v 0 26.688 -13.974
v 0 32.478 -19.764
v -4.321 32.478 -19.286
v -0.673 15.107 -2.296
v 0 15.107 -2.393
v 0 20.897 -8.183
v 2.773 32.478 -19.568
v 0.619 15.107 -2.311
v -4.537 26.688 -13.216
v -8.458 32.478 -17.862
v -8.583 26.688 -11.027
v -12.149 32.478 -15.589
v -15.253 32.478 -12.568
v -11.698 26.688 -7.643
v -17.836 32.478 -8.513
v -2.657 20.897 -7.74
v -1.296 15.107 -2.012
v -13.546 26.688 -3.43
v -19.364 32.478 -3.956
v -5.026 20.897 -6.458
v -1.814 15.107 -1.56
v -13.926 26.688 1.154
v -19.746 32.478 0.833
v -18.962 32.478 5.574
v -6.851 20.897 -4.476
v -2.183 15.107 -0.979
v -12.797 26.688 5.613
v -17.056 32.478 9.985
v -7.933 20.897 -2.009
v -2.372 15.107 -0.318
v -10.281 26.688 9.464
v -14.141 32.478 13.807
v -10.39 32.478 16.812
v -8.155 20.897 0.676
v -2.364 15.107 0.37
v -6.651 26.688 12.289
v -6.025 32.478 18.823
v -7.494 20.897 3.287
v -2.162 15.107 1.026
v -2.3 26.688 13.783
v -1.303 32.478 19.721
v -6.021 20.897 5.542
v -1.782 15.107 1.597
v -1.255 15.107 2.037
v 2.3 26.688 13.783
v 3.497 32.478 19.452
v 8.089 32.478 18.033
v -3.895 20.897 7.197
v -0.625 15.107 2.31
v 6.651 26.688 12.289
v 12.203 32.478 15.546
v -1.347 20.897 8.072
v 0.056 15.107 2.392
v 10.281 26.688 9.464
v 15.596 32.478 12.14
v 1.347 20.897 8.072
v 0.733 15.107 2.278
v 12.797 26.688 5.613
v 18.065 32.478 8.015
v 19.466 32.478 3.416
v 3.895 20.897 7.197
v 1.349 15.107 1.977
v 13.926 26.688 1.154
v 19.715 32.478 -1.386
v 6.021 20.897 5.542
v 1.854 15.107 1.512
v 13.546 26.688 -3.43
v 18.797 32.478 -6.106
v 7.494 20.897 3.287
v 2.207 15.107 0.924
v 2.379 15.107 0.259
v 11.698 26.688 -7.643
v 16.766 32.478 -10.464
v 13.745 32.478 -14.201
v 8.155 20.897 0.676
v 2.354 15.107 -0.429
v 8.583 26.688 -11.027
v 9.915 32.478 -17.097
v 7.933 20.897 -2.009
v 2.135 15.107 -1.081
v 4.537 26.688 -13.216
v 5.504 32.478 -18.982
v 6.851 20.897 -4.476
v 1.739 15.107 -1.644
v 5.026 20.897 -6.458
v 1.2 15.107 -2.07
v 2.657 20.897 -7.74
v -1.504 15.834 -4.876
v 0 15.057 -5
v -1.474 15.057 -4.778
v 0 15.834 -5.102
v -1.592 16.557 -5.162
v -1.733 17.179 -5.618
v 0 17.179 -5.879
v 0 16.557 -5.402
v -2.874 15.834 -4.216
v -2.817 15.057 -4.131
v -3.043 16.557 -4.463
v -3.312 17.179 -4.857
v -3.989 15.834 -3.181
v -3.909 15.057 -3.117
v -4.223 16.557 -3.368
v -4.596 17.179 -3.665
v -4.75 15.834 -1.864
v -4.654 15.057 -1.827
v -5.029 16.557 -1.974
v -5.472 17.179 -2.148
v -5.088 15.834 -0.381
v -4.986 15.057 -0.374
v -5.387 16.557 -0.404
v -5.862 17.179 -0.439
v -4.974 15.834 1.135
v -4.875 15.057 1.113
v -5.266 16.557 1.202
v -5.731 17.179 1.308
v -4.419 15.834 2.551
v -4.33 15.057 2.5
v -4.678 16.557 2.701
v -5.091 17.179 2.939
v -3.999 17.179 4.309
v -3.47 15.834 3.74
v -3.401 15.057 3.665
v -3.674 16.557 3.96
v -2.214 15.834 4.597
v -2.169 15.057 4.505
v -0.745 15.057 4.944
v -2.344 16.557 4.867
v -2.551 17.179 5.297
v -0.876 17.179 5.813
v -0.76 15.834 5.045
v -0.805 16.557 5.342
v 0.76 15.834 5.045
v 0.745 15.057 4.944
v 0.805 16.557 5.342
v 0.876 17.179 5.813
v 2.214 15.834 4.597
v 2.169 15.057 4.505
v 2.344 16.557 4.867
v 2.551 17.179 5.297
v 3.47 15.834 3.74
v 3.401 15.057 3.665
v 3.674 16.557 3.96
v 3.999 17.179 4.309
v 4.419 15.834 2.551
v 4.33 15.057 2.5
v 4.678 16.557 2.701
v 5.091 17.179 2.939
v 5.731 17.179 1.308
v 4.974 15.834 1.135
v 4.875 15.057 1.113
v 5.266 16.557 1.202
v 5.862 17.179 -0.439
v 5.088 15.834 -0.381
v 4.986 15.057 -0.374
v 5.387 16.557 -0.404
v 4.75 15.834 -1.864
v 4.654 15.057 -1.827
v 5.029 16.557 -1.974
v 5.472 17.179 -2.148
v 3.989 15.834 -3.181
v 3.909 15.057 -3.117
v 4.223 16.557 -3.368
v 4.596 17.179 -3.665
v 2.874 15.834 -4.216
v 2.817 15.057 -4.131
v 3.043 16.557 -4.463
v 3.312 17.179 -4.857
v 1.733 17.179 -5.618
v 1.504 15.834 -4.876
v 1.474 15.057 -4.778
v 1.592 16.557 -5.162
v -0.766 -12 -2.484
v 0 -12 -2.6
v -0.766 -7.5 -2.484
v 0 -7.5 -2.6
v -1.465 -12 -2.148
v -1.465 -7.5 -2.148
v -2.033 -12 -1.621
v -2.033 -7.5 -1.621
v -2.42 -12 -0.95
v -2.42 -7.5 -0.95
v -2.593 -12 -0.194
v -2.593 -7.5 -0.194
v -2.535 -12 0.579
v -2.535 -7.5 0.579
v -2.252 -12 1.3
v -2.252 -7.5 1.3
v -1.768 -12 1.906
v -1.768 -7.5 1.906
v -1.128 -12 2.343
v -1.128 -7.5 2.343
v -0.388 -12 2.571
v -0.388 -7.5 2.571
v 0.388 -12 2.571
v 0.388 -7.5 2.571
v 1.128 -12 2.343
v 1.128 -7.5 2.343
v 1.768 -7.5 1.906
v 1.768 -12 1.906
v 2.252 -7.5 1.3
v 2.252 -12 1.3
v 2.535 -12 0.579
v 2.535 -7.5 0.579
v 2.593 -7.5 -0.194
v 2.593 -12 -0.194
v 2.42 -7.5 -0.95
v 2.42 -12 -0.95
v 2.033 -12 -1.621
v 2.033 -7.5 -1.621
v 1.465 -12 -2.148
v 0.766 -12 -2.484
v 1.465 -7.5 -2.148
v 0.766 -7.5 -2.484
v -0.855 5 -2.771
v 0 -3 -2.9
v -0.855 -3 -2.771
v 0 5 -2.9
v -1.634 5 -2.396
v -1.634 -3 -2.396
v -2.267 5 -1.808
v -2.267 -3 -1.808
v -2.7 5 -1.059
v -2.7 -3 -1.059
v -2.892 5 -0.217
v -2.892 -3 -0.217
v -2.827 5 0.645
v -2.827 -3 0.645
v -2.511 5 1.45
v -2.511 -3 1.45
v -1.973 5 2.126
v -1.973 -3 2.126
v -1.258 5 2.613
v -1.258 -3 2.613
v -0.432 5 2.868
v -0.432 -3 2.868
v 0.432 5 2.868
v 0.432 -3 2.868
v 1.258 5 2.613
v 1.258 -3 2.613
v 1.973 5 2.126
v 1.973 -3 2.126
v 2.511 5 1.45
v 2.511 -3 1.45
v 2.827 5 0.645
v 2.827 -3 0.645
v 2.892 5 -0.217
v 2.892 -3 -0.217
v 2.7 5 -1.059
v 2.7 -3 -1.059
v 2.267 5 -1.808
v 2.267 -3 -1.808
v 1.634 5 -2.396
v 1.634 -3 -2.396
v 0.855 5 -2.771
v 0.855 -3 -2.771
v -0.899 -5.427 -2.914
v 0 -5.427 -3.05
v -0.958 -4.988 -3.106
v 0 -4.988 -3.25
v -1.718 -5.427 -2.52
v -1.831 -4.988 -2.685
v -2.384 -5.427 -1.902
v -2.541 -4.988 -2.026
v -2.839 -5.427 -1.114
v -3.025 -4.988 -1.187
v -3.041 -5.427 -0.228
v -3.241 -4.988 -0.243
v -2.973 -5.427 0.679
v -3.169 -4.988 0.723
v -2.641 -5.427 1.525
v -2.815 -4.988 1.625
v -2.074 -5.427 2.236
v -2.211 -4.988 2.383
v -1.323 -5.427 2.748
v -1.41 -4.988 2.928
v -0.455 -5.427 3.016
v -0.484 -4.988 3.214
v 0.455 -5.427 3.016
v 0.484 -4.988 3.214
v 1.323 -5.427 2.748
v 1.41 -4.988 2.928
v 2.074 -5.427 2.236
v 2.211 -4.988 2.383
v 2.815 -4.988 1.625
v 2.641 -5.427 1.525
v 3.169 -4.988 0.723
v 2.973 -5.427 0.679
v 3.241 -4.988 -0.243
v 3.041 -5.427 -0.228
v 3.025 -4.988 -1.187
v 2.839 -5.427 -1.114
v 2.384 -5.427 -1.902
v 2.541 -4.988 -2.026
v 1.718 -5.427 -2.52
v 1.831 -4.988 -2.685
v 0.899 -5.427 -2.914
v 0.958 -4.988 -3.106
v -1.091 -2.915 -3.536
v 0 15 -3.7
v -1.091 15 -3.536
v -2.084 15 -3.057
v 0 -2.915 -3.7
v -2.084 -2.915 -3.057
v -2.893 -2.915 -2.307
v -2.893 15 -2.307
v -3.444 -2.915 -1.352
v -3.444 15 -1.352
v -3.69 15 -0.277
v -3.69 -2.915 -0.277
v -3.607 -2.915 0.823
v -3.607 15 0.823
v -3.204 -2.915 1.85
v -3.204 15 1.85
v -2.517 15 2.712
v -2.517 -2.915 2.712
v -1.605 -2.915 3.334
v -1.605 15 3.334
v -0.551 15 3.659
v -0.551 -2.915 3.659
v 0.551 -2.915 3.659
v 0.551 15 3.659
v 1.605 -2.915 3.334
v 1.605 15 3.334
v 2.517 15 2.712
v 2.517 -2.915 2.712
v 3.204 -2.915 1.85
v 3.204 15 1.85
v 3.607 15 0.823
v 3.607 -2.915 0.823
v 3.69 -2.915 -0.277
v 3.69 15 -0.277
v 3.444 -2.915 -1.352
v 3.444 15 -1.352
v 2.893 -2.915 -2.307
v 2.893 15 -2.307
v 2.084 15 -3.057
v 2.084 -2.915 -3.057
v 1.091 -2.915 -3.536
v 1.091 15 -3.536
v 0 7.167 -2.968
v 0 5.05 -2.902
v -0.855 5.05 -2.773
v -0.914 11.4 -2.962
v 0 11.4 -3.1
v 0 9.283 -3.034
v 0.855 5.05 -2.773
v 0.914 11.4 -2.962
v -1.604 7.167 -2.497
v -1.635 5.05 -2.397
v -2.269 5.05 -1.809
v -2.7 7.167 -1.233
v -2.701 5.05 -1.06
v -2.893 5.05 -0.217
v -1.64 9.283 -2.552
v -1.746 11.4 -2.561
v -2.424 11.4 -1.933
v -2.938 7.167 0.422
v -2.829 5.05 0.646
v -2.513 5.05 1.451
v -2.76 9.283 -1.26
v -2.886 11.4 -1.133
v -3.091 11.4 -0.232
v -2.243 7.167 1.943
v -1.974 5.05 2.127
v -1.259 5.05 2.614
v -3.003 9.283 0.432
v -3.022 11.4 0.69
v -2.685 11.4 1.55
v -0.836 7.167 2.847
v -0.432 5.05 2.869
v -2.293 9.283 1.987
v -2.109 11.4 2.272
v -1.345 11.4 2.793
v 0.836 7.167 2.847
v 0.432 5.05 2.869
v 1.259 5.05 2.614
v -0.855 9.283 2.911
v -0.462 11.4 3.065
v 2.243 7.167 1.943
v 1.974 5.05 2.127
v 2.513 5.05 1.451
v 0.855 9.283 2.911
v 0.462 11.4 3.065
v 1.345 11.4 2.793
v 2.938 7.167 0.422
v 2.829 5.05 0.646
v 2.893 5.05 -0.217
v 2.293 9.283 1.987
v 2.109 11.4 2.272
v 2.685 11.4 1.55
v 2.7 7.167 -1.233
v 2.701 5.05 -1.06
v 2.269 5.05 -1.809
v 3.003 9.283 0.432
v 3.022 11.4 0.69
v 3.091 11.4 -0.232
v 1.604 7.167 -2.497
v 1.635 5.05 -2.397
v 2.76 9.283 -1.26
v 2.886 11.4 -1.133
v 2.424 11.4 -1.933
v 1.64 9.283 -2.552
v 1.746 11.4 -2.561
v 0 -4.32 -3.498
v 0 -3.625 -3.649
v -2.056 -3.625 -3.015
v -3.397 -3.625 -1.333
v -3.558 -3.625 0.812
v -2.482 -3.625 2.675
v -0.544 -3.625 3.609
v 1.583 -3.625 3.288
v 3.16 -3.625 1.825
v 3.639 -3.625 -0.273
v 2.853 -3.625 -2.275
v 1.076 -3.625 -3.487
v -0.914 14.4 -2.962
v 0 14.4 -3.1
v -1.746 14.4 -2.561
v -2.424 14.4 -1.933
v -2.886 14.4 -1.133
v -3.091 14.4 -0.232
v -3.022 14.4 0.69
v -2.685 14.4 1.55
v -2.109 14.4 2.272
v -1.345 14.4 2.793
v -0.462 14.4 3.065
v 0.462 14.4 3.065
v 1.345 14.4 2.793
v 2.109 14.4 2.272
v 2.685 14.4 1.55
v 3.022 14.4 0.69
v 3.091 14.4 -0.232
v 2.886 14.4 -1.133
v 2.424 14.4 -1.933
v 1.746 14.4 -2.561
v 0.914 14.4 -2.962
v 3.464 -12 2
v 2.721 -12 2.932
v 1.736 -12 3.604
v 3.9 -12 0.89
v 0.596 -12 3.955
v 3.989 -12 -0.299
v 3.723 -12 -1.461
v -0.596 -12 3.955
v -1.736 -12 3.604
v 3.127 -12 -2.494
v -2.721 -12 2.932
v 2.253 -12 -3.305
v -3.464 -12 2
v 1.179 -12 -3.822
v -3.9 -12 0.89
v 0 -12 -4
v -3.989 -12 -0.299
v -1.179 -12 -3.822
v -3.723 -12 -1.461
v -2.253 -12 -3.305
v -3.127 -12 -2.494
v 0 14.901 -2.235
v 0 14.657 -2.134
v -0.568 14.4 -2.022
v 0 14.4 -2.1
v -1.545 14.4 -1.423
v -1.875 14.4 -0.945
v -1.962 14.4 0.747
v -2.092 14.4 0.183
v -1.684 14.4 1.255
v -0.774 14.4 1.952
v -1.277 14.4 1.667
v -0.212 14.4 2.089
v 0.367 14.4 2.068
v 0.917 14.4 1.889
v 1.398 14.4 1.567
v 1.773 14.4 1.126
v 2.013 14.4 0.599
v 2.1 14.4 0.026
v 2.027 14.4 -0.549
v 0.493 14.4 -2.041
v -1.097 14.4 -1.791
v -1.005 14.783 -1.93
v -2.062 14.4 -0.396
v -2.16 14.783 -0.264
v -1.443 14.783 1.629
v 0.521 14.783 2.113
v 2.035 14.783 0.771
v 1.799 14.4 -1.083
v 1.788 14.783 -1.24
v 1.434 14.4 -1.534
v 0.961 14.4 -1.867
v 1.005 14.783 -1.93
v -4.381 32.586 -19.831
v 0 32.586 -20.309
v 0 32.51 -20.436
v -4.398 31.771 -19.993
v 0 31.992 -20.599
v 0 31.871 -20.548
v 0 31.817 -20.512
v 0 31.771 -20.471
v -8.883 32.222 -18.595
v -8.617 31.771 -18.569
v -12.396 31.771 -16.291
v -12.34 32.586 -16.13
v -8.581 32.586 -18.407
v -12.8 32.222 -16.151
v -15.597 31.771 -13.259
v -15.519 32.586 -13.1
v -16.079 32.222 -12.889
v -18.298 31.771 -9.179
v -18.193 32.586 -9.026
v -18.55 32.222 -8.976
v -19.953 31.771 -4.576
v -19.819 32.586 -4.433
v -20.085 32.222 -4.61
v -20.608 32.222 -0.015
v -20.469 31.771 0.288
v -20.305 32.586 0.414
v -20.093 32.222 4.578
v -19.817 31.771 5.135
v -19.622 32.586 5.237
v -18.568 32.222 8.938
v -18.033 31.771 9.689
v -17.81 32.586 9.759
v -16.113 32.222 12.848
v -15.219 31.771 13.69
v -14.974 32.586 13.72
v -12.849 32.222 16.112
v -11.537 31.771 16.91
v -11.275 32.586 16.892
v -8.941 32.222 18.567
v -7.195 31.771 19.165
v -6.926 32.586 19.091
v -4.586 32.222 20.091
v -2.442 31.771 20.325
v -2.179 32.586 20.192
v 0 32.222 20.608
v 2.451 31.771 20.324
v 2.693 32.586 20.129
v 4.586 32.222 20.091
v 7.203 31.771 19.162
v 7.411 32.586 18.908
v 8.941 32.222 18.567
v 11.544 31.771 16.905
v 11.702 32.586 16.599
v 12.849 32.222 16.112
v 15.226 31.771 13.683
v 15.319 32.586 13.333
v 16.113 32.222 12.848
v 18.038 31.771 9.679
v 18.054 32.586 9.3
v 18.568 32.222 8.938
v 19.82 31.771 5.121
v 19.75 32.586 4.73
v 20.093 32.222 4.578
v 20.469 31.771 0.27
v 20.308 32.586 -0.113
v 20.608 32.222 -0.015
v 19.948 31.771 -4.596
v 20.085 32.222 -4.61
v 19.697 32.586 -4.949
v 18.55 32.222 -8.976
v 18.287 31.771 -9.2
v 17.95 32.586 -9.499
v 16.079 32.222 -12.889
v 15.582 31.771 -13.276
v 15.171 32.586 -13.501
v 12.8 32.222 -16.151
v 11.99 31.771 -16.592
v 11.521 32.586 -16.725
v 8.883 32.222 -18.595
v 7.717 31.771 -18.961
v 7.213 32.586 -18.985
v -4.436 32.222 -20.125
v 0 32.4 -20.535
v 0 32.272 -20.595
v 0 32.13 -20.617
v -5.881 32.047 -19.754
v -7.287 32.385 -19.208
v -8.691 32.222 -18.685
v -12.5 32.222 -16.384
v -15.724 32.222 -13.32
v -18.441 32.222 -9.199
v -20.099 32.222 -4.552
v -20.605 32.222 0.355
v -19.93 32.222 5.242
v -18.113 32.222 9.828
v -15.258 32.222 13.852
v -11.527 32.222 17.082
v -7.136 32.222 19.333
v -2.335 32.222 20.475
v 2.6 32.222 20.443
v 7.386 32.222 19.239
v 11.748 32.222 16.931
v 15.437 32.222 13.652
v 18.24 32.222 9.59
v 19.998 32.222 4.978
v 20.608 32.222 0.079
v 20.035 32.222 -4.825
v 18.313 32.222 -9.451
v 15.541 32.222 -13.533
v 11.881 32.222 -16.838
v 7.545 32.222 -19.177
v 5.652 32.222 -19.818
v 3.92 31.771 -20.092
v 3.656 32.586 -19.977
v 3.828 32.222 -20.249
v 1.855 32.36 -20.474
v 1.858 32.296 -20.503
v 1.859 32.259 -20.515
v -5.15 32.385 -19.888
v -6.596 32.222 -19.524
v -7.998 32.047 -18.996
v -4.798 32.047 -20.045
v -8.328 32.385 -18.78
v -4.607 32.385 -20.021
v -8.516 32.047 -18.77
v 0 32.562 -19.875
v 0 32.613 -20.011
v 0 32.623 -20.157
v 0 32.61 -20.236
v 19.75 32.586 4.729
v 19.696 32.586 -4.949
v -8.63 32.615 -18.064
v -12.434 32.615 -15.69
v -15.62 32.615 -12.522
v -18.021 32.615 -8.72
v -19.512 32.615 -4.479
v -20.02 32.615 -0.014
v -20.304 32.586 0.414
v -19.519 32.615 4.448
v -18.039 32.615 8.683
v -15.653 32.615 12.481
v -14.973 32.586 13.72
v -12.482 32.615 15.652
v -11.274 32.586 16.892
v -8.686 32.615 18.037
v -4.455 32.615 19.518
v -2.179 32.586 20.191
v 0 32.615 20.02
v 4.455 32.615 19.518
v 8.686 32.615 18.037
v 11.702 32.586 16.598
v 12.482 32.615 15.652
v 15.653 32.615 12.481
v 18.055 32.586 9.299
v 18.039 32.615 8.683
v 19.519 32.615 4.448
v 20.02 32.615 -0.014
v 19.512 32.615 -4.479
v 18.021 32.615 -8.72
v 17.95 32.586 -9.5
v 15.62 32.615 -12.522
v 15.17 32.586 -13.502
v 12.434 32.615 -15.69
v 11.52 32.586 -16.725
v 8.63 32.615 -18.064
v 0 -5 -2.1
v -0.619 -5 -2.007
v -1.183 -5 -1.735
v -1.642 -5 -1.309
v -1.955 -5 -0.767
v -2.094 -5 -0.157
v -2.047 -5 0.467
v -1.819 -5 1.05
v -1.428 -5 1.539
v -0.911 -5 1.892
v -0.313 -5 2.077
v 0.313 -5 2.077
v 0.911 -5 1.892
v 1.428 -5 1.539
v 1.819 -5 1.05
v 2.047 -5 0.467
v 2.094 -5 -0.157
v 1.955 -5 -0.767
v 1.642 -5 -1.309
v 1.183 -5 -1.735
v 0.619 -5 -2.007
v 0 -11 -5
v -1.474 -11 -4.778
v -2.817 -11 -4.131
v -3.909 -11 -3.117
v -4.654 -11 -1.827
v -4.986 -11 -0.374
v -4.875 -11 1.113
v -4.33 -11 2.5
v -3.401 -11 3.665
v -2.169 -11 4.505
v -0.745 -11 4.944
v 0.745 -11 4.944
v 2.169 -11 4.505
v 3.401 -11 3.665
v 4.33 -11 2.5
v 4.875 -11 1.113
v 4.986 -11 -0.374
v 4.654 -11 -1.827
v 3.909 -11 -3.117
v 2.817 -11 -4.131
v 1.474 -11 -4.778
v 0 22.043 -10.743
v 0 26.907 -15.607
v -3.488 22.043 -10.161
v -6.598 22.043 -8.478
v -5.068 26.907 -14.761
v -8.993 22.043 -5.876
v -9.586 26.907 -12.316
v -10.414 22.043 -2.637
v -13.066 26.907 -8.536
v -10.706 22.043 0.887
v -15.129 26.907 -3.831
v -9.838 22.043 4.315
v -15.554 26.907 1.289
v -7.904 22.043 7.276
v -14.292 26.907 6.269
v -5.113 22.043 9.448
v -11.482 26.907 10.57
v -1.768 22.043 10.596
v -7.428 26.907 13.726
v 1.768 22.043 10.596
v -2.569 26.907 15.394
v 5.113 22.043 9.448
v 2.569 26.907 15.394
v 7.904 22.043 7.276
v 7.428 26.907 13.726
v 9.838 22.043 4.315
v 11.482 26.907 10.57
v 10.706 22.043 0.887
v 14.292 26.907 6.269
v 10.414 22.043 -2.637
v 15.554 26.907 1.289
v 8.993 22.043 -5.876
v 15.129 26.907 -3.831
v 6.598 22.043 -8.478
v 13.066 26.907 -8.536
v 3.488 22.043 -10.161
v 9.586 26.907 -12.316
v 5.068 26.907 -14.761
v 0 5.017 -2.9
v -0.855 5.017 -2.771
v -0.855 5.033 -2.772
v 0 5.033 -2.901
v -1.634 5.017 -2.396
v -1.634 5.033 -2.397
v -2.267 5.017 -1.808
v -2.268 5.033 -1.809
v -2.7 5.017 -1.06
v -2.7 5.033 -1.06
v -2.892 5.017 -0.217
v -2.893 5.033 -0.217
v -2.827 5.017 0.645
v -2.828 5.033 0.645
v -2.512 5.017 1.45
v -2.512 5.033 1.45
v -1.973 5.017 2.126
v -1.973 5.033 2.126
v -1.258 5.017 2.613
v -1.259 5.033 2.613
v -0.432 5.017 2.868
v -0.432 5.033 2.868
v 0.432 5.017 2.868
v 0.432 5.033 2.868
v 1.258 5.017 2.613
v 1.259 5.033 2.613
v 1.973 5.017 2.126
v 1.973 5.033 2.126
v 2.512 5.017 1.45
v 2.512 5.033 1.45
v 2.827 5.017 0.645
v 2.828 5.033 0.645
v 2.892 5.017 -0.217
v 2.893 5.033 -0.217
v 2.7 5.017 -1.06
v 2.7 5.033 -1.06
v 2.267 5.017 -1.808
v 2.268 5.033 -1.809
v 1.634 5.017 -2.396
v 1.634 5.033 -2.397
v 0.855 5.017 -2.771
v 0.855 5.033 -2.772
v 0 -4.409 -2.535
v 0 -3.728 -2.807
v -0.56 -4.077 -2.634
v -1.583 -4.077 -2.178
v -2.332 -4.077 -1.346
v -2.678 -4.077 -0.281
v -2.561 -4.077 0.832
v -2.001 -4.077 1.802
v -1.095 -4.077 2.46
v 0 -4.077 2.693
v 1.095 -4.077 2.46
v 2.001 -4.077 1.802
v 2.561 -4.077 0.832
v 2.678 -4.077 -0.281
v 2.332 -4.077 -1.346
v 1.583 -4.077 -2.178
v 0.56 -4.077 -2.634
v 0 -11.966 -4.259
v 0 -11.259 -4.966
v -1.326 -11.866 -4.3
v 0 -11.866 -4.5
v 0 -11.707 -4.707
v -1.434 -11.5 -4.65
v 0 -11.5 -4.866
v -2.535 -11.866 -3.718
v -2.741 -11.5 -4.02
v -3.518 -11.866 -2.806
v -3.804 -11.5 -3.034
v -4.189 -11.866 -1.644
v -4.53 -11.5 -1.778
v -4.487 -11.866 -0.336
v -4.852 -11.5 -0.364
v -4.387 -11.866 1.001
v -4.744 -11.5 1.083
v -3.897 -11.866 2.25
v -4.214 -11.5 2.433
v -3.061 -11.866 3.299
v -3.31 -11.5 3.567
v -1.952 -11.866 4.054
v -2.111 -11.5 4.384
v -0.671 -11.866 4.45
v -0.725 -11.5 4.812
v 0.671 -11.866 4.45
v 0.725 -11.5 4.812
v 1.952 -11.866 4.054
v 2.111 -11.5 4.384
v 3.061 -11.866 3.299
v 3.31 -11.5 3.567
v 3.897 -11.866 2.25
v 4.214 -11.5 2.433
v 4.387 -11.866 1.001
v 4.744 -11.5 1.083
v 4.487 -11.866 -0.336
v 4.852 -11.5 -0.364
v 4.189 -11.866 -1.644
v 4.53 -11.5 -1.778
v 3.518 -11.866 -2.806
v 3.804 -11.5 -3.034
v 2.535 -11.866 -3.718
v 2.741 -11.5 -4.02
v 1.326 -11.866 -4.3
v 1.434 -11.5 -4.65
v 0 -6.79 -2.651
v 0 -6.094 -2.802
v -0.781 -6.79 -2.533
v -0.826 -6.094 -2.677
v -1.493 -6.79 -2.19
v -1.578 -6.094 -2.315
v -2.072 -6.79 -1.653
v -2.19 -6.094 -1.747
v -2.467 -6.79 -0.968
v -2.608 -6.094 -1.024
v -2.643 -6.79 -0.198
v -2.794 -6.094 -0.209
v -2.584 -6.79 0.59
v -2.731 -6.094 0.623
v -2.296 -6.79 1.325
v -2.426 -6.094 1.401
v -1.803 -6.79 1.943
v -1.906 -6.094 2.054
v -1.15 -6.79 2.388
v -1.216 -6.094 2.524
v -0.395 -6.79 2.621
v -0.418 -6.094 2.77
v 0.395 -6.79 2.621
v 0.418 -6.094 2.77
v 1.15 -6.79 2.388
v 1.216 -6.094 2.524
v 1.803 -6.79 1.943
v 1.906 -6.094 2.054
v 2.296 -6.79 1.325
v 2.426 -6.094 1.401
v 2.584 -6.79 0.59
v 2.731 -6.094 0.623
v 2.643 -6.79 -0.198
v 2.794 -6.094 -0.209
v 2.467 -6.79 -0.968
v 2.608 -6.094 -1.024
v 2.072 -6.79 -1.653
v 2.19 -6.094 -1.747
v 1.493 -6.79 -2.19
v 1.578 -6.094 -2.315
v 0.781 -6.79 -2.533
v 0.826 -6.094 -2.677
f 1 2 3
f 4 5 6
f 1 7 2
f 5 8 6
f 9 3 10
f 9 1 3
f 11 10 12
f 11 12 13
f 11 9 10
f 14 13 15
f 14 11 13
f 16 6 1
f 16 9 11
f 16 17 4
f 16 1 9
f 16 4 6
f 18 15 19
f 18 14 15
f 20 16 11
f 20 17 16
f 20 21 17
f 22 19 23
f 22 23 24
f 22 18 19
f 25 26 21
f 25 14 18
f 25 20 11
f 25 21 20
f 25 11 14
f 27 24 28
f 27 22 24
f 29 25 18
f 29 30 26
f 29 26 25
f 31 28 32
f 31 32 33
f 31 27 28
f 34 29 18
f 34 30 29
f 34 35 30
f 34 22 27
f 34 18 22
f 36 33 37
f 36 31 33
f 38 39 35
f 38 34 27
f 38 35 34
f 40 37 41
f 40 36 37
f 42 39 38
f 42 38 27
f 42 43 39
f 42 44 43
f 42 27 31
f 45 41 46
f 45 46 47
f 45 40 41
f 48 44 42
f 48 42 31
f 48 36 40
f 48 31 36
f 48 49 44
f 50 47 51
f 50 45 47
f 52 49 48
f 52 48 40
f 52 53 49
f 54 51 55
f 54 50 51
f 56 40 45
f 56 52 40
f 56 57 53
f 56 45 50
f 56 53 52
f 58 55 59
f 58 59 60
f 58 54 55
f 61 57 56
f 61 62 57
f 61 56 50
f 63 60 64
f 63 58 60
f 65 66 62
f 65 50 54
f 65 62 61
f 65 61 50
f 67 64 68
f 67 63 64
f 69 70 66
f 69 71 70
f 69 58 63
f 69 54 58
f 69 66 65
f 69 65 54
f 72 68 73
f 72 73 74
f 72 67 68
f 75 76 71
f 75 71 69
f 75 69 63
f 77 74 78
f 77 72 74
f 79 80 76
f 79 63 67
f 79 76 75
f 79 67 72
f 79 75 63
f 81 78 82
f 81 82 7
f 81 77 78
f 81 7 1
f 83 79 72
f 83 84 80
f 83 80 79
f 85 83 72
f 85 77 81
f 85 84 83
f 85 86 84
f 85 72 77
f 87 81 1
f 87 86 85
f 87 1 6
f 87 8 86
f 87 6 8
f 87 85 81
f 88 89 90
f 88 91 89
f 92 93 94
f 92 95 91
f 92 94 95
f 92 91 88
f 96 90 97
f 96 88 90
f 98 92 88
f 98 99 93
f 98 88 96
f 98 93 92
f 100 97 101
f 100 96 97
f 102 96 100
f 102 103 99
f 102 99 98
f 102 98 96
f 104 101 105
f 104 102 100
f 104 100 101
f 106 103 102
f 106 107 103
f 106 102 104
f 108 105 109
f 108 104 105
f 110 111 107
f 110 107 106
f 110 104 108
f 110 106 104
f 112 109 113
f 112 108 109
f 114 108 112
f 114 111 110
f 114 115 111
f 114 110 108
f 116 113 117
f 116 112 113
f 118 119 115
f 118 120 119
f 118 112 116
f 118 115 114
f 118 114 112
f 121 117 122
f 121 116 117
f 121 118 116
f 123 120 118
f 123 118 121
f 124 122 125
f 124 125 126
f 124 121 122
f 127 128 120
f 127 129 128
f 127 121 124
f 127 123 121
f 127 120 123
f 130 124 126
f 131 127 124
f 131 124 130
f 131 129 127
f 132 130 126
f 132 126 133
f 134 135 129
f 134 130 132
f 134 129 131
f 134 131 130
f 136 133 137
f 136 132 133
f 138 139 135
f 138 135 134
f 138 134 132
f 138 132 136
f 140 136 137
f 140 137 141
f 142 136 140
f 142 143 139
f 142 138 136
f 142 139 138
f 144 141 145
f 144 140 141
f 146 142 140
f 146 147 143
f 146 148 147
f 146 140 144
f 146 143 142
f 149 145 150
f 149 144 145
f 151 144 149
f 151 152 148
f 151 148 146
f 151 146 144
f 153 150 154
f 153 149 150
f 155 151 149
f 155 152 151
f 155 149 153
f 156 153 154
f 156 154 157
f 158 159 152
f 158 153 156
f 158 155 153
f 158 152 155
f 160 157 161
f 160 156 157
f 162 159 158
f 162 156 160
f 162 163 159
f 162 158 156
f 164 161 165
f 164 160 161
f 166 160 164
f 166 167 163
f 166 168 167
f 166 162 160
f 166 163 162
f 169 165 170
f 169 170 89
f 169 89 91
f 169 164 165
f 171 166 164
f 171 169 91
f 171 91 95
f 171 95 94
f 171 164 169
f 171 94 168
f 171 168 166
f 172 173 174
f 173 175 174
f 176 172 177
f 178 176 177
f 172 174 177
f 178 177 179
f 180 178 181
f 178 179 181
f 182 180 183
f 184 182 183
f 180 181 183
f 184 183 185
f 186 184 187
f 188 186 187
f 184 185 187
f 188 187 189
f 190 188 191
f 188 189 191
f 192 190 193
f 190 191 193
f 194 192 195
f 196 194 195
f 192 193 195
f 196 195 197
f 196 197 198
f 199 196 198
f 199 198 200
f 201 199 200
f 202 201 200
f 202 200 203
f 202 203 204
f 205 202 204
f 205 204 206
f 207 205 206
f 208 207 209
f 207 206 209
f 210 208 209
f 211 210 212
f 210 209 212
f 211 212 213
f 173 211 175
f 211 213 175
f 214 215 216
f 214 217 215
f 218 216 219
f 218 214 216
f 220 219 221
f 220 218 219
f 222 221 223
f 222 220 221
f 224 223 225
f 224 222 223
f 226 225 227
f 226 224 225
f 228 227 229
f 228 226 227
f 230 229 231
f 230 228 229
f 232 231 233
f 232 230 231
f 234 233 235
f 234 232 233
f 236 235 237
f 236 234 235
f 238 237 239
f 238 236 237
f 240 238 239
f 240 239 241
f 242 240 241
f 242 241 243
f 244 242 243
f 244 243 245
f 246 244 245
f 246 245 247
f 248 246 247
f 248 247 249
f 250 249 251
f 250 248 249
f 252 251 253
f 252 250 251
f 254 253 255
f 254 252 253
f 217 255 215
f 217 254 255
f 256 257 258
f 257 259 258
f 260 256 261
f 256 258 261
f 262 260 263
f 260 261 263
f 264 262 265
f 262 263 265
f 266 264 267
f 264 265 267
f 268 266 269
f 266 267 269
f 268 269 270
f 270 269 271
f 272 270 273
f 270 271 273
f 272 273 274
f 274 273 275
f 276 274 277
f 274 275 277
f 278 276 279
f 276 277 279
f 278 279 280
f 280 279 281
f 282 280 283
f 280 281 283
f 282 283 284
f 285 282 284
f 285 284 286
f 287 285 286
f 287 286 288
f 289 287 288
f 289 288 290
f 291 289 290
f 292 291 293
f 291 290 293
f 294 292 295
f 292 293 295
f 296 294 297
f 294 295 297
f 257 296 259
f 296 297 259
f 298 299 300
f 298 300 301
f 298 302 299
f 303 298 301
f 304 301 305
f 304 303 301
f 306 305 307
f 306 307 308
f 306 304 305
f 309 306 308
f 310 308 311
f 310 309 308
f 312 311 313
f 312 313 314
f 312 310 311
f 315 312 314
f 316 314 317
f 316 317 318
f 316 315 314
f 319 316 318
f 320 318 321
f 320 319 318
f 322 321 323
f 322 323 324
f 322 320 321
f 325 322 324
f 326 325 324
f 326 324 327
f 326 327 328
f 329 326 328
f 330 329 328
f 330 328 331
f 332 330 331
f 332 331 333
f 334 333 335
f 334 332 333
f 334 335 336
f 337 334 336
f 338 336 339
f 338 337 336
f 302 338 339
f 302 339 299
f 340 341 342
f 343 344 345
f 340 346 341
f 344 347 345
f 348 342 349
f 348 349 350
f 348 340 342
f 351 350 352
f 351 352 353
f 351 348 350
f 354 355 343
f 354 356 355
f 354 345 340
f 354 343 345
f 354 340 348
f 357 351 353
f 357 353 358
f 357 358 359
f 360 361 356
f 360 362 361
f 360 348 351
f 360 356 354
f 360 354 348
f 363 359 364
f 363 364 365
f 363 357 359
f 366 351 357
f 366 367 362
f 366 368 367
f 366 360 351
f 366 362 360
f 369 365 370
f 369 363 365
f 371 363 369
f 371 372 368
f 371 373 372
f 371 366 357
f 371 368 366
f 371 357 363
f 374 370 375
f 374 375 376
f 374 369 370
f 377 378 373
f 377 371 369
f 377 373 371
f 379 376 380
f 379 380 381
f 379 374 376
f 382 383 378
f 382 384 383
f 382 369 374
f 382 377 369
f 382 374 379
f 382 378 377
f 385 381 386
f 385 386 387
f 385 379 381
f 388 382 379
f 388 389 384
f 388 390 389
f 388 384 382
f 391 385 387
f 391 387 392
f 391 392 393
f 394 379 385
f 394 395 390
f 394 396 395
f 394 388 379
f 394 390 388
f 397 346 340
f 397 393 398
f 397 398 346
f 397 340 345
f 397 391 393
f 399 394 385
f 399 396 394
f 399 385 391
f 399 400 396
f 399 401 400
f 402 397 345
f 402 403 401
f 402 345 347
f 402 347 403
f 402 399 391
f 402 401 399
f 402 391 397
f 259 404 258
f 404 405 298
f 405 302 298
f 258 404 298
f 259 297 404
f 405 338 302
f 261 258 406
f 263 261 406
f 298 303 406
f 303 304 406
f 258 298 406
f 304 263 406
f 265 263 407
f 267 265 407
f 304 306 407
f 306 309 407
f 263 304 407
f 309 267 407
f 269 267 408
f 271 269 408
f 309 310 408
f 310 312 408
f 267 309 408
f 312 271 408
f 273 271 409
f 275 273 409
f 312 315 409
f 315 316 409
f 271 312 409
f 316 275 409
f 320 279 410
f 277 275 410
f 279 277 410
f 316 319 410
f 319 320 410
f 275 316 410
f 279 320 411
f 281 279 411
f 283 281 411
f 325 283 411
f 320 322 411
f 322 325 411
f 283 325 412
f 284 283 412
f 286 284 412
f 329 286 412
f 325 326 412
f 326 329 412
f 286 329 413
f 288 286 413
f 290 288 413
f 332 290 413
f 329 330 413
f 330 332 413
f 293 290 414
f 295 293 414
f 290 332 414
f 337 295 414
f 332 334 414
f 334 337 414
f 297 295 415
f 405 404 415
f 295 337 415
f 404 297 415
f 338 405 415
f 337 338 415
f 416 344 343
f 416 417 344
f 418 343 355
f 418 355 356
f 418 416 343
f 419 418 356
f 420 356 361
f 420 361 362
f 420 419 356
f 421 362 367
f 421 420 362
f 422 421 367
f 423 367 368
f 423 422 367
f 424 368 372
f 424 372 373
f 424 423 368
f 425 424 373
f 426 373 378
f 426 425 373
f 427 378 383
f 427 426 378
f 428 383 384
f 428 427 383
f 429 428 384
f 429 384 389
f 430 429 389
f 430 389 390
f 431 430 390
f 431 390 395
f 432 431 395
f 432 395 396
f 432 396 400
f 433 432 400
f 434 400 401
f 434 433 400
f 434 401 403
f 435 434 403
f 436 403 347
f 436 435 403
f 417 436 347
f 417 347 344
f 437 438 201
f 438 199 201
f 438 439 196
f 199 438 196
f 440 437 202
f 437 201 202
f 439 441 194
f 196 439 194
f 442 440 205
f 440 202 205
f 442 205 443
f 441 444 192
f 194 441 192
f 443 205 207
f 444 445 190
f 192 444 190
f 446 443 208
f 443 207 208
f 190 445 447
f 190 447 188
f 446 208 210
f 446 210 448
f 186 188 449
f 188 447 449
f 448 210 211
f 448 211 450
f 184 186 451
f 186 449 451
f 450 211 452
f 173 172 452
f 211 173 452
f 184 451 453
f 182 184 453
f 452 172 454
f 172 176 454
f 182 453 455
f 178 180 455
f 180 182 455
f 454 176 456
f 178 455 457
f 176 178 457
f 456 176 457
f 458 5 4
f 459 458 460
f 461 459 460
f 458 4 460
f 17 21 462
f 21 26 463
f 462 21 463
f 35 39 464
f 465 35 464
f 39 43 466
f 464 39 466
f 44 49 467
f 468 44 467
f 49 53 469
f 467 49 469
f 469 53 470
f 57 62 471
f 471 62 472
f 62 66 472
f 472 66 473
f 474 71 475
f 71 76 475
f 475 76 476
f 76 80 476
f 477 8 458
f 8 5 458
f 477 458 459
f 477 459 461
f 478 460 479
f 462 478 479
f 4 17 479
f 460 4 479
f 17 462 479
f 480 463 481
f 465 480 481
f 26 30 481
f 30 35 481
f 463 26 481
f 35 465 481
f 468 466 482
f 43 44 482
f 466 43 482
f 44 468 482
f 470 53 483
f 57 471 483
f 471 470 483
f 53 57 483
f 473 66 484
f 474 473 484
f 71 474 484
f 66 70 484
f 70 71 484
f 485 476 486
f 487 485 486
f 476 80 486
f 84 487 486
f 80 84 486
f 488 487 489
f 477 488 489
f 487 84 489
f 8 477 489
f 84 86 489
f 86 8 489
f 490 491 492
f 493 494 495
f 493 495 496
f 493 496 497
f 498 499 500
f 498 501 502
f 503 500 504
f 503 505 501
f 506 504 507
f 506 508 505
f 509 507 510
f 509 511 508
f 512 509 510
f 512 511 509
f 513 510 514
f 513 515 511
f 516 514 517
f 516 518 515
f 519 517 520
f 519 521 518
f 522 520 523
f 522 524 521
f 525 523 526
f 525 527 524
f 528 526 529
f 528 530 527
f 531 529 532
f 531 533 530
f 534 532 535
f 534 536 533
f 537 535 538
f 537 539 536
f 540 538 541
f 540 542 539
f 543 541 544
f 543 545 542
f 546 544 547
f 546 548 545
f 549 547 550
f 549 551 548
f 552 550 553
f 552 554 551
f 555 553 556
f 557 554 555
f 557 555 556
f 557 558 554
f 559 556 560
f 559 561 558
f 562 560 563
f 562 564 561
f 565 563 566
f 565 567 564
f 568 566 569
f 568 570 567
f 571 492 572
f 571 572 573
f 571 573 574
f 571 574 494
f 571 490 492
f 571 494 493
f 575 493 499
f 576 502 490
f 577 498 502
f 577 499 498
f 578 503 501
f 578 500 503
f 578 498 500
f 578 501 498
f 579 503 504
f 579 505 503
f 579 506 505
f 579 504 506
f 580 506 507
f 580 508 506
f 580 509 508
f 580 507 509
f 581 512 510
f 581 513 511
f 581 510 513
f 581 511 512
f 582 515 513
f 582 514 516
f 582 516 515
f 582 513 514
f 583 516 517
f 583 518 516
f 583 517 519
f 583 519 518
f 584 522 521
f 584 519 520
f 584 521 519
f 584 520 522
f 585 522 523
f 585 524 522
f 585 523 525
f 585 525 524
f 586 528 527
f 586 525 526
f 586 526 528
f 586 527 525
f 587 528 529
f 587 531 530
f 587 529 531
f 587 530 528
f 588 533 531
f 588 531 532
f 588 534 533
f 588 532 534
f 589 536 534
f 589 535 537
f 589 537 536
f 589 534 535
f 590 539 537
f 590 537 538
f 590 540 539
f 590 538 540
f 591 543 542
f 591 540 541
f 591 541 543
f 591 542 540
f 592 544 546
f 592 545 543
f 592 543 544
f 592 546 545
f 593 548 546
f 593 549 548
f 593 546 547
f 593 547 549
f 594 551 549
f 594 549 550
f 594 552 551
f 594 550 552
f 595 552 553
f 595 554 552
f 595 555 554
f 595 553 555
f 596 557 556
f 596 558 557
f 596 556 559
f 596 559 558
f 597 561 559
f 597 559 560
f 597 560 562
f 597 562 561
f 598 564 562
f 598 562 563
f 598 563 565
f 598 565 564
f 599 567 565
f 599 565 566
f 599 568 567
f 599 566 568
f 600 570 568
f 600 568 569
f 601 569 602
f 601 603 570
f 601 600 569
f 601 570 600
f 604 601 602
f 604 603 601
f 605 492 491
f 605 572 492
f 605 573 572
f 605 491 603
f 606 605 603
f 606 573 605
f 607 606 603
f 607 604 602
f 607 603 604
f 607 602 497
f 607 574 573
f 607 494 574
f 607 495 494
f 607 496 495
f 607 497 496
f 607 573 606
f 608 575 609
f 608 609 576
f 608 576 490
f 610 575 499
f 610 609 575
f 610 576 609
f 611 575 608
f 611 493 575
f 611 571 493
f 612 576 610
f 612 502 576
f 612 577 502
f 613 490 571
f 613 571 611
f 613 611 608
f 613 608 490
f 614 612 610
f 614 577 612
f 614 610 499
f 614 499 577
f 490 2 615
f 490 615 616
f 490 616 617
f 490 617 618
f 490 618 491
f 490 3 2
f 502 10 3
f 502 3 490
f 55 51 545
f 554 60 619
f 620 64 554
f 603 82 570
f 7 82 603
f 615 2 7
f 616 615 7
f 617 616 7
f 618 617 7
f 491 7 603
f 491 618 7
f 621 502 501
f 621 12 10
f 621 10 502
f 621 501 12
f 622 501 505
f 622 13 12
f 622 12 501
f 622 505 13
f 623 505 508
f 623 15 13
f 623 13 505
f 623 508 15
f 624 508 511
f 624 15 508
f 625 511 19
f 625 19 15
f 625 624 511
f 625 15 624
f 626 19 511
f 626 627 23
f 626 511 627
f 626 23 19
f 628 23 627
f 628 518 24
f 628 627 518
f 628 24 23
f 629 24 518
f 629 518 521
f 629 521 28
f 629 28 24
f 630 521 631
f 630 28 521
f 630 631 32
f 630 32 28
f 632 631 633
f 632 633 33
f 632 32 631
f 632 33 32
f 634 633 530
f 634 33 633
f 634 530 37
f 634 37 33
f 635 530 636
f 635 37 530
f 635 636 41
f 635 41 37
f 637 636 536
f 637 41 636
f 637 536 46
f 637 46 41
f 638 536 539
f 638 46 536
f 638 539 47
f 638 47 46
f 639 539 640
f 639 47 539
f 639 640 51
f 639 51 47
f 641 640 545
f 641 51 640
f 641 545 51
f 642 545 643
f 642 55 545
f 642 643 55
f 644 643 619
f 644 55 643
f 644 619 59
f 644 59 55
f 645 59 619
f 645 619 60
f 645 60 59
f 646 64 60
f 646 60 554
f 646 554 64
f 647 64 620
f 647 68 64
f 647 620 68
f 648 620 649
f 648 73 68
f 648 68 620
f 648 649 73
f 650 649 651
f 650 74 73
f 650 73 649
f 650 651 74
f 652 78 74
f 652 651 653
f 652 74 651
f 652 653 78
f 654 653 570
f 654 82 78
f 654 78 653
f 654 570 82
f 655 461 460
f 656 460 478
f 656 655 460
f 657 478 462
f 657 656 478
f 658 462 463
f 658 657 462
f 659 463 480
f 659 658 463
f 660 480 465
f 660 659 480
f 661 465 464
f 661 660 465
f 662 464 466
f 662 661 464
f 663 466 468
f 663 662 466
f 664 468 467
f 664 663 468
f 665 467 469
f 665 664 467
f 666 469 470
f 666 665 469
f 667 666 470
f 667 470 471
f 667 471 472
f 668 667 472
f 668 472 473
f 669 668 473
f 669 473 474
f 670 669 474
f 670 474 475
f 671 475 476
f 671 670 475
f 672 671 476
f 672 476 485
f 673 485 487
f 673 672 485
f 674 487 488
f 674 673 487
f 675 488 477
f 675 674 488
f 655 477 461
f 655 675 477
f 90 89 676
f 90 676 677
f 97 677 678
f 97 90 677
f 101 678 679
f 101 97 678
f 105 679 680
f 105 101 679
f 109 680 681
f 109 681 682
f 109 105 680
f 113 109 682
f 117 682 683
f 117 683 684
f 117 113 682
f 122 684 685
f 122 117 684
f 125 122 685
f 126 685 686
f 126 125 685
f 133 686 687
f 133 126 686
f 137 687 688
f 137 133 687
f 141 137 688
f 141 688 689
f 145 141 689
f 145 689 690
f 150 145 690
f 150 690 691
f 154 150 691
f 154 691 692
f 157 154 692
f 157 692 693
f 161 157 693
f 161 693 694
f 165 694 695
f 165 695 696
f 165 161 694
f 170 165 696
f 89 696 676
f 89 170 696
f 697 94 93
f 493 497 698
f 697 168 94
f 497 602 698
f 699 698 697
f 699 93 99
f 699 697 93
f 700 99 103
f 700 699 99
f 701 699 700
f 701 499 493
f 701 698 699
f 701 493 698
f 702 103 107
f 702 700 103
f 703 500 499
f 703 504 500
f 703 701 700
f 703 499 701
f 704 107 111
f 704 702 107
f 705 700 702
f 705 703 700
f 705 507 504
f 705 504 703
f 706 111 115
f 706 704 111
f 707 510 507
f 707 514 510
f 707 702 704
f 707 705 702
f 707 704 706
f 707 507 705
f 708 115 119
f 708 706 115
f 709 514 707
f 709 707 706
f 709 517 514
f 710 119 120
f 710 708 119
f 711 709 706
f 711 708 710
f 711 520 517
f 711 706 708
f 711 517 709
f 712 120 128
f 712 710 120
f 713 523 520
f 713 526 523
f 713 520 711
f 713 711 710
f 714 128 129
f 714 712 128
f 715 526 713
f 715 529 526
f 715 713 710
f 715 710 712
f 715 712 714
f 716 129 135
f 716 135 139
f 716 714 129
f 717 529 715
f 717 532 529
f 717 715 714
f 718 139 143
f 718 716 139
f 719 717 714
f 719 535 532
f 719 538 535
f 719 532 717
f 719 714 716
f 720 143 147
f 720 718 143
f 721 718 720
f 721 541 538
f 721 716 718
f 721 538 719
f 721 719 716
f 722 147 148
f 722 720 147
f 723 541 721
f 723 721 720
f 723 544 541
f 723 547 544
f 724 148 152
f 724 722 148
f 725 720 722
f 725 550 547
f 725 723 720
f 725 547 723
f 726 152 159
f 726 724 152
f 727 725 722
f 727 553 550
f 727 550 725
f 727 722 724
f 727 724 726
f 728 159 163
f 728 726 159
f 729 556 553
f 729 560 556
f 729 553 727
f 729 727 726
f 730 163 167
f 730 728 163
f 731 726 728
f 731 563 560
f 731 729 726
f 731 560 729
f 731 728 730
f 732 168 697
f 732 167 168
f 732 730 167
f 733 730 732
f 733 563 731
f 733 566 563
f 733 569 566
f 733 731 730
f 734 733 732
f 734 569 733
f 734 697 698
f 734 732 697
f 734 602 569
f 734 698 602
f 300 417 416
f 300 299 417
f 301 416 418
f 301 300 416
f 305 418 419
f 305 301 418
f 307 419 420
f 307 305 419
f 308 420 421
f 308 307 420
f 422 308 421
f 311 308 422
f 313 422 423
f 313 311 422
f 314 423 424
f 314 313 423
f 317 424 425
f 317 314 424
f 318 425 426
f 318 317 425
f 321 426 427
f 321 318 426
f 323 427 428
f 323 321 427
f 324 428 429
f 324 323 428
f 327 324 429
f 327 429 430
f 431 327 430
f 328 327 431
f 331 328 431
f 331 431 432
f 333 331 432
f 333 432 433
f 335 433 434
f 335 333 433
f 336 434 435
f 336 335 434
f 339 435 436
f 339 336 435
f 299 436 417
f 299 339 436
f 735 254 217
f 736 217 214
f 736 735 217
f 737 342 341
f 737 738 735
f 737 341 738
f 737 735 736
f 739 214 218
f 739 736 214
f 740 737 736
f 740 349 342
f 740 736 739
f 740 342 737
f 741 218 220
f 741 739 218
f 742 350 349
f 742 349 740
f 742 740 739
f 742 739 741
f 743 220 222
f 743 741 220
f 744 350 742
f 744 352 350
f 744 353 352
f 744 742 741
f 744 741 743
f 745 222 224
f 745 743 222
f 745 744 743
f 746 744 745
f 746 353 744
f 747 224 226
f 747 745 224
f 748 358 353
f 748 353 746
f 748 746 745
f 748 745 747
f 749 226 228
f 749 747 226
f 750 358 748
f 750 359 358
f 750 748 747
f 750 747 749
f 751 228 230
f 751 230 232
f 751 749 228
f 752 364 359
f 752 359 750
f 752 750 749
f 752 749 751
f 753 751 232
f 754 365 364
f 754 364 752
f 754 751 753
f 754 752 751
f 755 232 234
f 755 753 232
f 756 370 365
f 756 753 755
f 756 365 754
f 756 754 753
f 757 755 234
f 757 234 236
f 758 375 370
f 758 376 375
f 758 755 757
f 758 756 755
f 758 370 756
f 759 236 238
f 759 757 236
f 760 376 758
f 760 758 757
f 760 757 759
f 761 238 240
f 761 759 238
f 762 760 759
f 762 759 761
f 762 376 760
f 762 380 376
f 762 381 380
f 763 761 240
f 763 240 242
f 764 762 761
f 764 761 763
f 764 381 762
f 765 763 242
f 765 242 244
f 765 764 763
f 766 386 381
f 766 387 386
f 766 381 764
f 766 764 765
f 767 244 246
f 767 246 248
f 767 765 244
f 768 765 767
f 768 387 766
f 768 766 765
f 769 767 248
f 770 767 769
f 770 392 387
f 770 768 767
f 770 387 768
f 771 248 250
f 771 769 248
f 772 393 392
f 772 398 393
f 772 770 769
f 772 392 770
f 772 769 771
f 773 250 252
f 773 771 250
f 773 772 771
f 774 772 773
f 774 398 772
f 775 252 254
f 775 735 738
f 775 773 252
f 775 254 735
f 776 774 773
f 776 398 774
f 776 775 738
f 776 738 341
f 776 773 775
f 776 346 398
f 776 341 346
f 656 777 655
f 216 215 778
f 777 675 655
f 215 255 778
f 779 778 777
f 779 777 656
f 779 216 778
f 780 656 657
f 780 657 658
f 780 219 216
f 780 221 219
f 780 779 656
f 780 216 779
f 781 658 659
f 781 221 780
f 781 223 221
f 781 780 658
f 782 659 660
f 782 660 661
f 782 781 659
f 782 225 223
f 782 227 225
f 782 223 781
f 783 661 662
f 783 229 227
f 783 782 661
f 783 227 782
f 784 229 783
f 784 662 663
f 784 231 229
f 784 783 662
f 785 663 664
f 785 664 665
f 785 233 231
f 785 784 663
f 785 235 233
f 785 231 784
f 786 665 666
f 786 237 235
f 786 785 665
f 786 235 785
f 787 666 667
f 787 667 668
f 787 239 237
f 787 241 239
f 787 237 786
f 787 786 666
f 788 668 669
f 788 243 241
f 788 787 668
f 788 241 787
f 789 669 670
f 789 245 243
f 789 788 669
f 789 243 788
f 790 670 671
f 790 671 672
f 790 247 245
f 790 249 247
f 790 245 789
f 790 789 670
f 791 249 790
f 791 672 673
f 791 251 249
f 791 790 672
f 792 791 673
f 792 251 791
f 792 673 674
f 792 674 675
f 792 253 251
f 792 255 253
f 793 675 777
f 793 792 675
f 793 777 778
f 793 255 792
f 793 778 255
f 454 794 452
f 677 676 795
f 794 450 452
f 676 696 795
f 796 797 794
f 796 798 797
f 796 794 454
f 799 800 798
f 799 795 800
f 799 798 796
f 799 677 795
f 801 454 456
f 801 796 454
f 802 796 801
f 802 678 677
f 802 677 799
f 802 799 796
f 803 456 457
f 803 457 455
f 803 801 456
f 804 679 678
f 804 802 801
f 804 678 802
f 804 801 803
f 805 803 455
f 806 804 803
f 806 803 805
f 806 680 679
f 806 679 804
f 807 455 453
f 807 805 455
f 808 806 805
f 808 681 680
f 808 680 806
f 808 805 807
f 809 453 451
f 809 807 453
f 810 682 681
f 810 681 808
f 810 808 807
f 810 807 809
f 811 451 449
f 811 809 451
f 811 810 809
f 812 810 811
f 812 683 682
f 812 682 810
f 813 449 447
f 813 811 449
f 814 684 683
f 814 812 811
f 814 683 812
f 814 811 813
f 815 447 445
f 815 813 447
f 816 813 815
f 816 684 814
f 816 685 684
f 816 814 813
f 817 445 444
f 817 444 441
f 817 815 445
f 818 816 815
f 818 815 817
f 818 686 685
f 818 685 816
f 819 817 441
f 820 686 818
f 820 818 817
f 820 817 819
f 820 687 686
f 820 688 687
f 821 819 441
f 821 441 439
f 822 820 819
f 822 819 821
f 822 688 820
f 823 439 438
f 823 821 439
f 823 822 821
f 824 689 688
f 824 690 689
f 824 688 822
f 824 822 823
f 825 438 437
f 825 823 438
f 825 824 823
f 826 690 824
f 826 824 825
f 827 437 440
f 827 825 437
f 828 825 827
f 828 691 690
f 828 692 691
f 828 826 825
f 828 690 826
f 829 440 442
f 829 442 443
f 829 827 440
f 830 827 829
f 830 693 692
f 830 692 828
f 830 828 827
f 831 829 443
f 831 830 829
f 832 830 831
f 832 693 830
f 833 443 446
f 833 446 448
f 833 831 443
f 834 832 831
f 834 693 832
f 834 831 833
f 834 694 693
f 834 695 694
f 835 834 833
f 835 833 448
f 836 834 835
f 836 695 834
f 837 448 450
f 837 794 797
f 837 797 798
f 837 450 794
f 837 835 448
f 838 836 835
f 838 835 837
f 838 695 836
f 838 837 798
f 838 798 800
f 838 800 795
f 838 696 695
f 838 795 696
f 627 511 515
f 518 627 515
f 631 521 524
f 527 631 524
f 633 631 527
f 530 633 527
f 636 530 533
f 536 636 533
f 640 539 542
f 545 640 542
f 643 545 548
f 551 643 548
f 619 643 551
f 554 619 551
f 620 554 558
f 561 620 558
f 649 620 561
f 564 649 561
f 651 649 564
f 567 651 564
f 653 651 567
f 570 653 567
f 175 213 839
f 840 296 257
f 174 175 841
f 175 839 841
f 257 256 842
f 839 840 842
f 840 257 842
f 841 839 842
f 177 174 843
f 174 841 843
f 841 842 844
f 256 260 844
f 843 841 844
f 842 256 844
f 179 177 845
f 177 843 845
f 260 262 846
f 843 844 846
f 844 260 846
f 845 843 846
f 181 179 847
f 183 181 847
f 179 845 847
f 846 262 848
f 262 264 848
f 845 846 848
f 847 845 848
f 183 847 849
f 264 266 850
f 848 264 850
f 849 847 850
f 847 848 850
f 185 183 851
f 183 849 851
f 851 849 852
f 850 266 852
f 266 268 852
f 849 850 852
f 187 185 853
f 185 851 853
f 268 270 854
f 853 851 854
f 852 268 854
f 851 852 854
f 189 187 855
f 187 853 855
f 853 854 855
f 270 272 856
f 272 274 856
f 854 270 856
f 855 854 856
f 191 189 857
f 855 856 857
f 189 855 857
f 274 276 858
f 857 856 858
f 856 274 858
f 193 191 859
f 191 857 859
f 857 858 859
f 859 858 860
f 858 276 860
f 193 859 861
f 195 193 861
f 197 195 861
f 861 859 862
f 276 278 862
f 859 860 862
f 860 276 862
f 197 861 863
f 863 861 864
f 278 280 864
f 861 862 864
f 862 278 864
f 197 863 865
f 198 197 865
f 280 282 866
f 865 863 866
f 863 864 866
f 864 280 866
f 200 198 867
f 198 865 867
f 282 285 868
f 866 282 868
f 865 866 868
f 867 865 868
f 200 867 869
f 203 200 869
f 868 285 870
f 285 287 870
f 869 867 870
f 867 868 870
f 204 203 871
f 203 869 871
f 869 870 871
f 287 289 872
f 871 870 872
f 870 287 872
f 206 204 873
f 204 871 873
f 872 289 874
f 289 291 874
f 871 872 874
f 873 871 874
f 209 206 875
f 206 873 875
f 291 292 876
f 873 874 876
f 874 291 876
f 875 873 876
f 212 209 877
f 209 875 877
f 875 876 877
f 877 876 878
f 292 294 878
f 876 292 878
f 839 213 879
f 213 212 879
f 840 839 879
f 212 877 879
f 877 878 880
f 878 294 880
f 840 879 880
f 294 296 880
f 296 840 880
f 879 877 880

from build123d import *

# Parameters (mm, degrees)
SKETCH_2_W   = 1.3
SKETCH_2_H   = 0.6
SKETCH_2_H_2 = 5
SKETCH_2_H_3 = 0.8
FILLET_2_R   = 1
FILLET_3_R   = 1
FILLET_4_R   = 0.5


with BuildPart() as part:
    # Эскиз2 → Повернуть8 (revolve)
    with BuildSketch(Plane.XY, mode=Mode.PRIVATE) as revolve_8_sk:
        with BuildLine():
            Line((2.1, 14.814213562), (2.1, 14.4))
            Line((2.1, 14.4), (3.1, 14.4))
            Line((3.1, 14.4), (3.7, 15))
            Line((3.7, 15), (3.7, 11.4))
            Line((3.7, 11.4), (5, 11.4))
            Line((5, 11.4), (5, 15.057359313))
            ThreePointArc((5, 15.057359313), (5.228361402, 16.20540961), (5.878679656, 17.178679656))
            Line((5.878679656, 17.178679656), (21, 32.3))
            Line((21, 32.3), (20, 32.714213562))
            Line((20, 32.714213562), (2.1, 14.814213562))
        make_face()
        with BuildLine():
            Line((2.1, 14.4), (2.1, 0))
            Line((2.1, 0), (2.1, -5))
            ThreePointArc((2.1, -5), (2.692582404, -4.077032961), (2.9, -3))
            Line((2.9, -3), (2.9, 0))
            Line((2.9, 0), (2.9, 5))
            ThreePointArc((2.9, 5), (2.900390339, 5.024987802), (2.901560976, 5.04995122))
            Line((2.901560976, 5.04995122), (3.1, 11.4))
            Line((3.1, 11.4), (3.1, 14.4))
            Line((3.1, 14.4), (2.1, 14.4))
        make_face()
        with Locations((4.35, 11.1)):
            Rectangle(SKETCH_2_W, SKETCH_2_H)
        with Locations((4.35, 8.3)):
            Rectangle(SKETCH_2_W, SKETCH_2_H_2)
        with Locations((4.35, 5.4)):
            Rectangle(SKETCH_2_W, SKETCH_2_H_3)
        with BuildLine():
            ThreePointArc((3.250170339, -4.987520547), (3.586248648, -3.975312617), (3.7, -2.91485321))
            Line((3.7, -2.91485321), (3.7, 0))
            Line((3.7, 0), (3.7, 5))
            Line((3.7, 5), (5, 5))
            Line((5, 5), (5, 0))
            Line((5, 0), (5, -12))
            Line((5, -12), (2.6, -12))
            Line((2.6, -12), (2.6, -7.5))
            ThreePointArc((2.6, -7.5), (2.713751352, -6.439540593), (3.049829661, -5.427332663))
            Line((3.049829661, -5.427332663), (3.250170339, -4.987520547))
        make_face()
    revolve(revolve_8_sk.sketch.rotate(Axis((0, 0, 0), (0, 1, 0)), 90), axis=Axis((0, 0, 0), (0, 1, 0)))

    # Скругление2
    fillet_2_edges = [part.edges().sort_by_distance(p)[0] for p in [
        (0, -12, 5),
    ]]
    fillet(fillet_2_edges, radius=FILLET_2_R)

    # Скругление3
    fillet_3_edges = [part.edges().sort_by_distance(p)[0] for p in [
        (0, 14.814213562, 2.1),
    ]]
    fillet(fillet_3_edges, radius=FILLET_3_R)

    # Скругление4
    fillet_4_edges = [part.edges().sort_by_distance(p)[0] for p in [
        (0, 32.714213562, 20),
        (0, 32.3, 21),
    ]]
    fillet(fillet_4_edges, radius=FILLET_4_R - 0.0001)  # a hair under: the kernel refuses the full size


solid = part.part
